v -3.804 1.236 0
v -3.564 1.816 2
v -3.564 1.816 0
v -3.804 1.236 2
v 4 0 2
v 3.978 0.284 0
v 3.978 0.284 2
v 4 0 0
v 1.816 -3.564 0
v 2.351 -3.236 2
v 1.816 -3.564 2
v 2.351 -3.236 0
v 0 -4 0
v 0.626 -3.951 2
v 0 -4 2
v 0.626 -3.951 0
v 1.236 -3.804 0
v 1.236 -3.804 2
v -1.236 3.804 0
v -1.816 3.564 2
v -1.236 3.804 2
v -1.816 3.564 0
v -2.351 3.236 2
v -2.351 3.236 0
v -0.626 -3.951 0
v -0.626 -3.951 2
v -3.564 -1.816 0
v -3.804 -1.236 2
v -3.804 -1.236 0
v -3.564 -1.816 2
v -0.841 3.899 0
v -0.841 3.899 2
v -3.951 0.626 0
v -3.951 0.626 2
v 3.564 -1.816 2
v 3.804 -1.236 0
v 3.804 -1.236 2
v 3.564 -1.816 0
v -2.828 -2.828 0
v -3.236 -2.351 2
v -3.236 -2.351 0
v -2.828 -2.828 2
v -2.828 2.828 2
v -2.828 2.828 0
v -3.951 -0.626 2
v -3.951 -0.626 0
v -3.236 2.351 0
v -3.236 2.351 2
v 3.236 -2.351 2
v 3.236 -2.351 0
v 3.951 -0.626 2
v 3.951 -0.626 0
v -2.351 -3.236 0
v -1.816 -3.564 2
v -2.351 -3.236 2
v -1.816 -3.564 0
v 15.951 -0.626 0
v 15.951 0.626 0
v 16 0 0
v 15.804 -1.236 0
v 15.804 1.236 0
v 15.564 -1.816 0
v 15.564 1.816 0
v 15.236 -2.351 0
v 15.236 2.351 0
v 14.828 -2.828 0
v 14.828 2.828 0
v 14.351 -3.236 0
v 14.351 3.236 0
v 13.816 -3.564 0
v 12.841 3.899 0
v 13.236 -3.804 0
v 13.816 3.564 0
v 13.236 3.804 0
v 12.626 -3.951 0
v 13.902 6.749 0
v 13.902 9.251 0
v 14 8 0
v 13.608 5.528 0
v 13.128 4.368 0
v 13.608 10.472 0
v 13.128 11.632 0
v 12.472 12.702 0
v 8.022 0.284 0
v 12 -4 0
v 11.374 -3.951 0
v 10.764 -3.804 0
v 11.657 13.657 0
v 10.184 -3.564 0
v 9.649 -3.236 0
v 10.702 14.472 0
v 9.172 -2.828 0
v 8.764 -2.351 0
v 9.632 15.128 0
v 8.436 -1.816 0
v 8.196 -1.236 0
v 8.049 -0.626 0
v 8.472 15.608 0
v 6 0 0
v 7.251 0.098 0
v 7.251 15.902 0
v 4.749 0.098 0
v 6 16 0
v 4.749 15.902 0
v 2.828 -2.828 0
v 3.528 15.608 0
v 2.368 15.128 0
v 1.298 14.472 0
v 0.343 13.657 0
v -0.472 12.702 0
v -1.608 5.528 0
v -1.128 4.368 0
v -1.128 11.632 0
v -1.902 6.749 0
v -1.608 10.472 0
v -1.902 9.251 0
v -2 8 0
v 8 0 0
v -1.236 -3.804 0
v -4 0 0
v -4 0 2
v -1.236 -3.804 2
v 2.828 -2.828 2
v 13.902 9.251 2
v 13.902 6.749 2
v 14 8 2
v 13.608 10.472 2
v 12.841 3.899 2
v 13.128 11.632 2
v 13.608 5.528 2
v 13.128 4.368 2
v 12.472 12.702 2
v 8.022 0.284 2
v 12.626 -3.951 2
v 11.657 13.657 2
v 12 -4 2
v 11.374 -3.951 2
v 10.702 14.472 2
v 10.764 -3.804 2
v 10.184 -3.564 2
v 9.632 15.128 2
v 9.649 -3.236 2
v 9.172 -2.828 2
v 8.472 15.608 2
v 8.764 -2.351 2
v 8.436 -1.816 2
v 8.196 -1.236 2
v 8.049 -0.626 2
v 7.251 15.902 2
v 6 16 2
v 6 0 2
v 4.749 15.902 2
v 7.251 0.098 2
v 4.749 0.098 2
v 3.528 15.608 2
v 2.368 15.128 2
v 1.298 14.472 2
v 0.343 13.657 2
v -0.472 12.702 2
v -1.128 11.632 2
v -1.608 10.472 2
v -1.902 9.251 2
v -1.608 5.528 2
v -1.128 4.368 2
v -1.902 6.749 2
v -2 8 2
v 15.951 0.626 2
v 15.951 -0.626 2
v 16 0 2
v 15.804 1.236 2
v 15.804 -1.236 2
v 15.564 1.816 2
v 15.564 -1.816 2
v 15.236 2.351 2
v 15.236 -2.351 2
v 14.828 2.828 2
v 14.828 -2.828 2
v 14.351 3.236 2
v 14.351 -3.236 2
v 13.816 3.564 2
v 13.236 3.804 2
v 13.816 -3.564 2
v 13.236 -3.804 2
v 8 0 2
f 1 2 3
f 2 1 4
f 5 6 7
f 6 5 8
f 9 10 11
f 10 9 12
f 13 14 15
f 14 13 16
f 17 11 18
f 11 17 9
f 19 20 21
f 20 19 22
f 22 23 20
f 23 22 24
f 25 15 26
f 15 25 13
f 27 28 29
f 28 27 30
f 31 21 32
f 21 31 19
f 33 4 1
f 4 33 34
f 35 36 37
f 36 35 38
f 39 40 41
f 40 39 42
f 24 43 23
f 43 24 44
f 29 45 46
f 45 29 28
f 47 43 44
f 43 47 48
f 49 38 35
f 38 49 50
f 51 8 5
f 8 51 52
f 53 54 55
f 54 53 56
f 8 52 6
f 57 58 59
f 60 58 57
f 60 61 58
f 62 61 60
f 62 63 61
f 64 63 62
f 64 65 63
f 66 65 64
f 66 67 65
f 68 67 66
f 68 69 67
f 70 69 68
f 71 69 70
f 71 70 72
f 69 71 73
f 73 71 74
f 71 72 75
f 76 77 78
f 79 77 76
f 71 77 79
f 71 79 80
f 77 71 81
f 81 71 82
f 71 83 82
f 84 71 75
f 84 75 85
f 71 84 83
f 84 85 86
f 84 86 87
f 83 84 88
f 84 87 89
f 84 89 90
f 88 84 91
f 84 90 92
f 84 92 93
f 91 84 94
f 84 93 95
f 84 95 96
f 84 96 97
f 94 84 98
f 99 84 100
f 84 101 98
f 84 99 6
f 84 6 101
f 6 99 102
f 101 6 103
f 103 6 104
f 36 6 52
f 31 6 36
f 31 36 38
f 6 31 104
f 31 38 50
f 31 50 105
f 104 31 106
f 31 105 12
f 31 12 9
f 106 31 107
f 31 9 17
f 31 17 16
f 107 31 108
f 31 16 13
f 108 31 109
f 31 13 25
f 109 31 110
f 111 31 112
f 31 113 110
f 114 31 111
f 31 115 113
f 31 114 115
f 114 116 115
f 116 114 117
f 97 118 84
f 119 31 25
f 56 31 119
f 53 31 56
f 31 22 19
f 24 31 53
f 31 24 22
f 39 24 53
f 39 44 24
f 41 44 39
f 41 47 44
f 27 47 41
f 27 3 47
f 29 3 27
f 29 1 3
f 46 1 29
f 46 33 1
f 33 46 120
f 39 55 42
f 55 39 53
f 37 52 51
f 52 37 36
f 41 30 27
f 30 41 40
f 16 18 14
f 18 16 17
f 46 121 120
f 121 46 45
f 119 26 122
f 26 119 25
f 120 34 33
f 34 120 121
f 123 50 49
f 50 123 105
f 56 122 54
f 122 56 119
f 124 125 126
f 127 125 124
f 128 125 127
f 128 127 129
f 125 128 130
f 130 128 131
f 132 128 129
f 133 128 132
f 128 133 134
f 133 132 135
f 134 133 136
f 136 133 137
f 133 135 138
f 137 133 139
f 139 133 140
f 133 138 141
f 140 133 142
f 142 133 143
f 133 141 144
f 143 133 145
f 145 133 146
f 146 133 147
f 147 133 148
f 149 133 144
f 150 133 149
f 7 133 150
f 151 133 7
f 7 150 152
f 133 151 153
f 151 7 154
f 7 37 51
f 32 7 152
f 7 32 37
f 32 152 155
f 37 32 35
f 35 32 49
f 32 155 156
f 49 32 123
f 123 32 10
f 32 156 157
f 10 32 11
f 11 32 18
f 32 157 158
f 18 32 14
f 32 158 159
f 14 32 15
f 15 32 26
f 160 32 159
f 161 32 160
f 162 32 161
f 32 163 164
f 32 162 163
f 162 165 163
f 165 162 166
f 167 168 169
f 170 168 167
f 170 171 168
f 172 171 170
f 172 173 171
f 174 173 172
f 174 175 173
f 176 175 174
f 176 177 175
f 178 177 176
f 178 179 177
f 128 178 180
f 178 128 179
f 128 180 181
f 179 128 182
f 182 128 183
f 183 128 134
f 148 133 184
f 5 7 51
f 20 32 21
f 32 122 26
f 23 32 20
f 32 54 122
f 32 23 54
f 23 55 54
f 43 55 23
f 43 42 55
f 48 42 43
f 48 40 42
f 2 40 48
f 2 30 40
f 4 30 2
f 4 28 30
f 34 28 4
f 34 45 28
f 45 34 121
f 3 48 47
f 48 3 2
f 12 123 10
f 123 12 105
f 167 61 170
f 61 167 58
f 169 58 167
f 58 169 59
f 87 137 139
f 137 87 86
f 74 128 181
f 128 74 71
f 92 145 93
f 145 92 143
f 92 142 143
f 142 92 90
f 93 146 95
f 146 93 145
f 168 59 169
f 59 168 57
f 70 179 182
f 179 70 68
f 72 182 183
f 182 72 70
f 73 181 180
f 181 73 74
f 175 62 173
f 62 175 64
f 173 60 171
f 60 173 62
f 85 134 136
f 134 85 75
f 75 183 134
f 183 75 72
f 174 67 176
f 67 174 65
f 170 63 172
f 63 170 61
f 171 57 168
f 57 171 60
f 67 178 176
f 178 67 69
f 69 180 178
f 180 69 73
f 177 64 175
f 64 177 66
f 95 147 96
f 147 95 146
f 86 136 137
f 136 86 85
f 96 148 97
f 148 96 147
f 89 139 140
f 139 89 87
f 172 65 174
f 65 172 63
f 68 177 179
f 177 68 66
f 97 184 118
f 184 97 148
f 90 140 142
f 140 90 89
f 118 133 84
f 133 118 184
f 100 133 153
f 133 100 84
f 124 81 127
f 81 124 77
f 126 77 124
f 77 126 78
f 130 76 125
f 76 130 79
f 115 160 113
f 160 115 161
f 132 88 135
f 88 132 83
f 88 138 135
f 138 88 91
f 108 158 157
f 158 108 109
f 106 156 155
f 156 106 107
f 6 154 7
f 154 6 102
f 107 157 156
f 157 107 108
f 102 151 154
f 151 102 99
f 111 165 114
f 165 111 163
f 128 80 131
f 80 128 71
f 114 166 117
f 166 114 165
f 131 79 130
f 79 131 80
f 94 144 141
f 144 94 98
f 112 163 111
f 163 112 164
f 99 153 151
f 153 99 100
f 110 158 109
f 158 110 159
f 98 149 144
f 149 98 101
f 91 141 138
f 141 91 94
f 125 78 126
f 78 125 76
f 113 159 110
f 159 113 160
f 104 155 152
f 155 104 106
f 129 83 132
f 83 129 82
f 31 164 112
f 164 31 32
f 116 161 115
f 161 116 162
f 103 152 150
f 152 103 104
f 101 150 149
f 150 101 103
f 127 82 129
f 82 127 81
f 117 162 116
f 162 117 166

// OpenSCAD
//3D Shapes- Design Time: Mouse

$fn = 40;

cylinder(h=2, r=4);
translate([12, 0, 0]) cylinder(h=2, r=4);
translate([6, 8, 0]) cylinder(h=2, r=8);
